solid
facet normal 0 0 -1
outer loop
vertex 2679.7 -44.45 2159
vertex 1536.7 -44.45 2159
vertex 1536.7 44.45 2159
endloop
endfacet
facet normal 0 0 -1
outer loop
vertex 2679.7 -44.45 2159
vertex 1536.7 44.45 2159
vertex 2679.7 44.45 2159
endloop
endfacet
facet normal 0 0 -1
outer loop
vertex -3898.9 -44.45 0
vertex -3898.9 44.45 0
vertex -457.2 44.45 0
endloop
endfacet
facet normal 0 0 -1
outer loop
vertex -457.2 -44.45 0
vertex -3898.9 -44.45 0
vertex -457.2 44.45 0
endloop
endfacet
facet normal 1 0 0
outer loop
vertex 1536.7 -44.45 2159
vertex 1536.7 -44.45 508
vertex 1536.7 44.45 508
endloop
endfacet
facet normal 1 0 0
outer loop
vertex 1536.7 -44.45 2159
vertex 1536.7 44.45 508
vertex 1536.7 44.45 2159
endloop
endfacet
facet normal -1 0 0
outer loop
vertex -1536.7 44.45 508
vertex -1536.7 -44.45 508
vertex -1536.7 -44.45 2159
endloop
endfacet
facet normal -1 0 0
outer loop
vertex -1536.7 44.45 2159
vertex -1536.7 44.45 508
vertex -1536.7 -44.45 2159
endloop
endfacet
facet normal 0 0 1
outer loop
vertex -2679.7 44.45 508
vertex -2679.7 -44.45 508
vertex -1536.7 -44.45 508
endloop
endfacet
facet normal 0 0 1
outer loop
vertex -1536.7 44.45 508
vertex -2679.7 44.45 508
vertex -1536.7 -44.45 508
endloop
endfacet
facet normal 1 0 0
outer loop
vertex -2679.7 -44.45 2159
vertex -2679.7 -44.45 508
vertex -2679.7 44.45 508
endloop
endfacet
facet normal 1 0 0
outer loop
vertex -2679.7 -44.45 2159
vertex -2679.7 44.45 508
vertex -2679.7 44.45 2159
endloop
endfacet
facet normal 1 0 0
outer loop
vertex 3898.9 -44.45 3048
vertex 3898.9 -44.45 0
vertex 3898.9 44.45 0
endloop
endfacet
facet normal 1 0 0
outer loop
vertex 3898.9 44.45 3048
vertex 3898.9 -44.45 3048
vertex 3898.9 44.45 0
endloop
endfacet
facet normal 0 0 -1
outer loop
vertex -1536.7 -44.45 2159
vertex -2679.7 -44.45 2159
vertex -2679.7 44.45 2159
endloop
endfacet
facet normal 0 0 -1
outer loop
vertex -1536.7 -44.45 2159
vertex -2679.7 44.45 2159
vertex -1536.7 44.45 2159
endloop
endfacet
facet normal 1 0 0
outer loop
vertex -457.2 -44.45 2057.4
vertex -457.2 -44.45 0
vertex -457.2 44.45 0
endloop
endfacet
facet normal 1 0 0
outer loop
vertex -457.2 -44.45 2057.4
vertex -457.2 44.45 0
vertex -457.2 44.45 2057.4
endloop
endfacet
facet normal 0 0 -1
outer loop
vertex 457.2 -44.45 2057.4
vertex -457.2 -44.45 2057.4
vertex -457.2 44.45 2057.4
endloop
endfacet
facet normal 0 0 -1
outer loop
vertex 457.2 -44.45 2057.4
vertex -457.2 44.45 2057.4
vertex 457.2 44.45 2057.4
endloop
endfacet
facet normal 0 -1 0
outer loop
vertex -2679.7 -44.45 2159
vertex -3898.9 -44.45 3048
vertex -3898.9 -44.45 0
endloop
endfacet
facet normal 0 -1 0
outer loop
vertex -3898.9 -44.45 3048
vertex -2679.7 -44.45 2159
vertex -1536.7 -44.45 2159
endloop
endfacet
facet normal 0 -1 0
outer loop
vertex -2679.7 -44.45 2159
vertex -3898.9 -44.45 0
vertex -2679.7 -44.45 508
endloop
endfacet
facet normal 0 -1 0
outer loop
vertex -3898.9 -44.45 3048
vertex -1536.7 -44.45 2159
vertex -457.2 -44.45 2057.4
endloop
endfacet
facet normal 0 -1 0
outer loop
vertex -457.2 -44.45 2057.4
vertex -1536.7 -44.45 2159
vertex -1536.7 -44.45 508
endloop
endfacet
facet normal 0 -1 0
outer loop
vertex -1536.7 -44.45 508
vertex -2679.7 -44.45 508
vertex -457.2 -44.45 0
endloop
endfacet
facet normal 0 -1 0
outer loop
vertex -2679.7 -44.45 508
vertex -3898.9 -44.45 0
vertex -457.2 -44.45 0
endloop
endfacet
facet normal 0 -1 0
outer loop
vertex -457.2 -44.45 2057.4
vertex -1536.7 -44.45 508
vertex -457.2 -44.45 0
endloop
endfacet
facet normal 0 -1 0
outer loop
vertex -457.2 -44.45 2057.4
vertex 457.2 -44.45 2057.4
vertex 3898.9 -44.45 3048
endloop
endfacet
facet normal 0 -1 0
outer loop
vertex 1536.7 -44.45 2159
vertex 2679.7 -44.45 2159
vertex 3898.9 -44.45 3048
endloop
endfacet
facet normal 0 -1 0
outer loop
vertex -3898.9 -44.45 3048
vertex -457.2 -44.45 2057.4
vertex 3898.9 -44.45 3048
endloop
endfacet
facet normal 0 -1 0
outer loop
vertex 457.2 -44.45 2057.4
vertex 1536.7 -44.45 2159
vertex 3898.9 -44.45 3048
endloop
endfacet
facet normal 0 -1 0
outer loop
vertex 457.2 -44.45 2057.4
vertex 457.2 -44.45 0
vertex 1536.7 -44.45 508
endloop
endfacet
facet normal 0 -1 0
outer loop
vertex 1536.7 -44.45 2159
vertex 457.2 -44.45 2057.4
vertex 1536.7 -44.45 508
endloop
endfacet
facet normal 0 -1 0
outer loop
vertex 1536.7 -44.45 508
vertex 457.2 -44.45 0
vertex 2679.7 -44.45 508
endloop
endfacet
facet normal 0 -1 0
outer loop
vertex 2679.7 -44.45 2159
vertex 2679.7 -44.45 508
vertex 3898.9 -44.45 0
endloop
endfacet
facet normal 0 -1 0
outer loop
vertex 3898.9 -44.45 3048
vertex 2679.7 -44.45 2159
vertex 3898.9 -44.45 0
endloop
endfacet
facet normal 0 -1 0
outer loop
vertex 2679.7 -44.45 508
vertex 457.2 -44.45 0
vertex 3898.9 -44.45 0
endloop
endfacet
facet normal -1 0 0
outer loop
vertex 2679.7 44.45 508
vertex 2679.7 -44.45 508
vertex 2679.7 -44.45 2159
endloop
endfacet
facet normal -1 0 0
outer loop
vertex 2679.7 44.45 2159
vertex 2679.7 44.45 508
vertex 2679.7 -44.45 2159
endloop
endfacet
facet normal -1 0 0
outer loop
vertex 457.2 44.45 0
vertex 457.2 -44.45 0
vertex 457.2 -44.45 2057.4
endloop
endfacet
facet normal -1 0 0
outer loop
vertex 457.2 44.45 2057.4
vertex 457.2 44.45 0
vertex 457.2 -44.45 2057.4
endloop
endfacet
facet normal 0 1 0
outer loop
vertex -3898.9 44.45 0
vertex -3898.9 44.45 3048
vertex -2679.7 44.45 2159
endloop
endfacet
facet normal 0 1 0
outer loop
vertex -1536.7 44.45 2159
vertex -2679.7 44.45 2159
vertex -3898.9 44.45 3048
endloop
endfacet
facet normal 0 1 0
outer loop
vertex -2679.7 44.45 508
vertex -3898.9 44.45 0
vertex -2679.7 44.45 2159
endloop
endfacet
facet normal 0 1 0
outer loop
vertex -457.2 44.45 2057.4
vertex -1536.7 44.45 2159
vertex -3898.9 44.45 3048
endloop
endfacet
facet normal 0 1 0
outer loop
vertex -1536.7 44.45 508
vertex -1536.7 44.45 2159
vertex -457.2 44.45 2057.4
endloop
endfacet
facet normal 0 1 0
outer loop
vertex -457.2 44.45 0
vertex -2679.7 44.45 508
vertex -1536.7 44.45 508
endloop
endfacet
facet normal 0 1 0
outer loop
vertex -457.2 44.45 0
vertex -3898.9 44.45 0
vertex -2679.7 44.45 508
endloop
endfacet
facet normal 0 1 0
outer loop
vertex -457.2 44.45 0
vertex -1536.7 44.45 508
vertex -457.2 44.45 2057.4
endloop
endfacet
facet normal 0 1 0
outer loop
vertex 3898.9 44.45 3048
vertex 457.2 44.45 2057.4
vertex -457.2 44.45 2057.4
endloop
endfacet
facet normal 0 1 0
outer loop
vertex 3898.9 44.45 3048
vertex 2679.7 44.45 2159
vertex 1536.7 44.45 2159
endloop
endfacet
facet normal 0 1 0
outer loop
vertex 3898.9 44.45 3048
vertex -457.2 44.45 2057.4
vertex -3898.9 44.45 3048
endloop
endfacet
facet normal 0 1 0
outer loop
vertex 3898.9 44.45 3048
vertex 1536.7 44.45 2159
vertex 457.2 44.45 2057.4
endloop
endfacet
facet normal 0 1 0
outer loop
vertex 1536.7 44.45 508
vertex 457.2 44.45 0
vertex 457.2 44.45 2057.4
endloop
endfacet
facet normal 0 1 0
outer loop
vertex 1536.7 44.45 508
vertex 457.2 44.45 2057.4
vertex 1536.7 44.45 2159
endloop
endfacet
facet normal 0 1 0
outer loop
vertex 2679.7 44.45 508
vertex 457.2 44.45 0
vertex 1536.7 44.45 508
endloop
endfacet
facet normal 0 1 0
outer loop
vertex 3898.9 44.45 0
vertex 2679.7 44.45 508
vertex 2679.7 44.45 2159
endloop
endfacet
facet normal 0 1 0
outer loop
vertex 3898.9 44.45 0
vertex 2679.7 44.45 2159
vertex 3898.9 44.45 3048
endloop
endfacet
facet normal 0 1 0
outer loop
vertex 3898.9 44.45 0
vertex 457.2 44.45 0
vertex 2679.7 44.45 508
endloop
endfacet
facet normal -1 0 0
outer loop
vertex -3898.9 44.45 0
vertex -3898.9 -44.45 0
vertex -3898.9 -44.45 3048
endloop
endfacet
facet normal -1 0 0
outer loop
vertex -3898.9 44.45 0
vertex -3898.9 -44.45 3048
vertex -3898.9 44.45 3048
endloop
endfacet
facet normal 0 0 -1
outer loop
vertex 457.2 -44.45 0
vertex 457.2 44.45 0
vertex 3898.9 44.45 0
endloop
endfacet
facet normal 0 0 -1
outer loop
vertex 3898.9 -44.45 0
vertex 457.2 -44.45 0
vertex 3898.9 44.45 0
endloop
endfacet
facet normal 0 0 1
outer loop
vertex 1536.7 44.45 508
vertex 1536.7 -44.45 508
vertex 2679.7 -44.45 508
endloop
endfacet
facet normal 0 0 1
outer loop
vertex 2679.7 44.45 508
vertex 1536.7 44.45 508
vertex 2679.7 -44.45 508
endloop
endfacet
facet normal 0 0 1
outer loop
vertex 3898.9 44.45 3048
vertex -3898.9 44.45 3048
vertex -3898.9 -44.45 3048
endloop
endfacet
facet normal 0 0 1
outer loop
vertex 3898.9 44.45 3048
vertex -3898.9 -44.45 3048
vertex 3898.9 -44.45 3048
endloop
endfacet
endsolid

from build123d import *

# Parameters (mm, degrees)
F0_W     = 7797.8
F0_H     = 88.9
F1_DEPTH = 3048
F2_W     = 1143
F2_H     = 1651
F2_W_2   = 914.4
F2_H_2   = 2057.4
F3_DEPTH = 88.901


with BuildPart() as f1:
    # F0 (on Top) → F1 (new body)
    with BuildSketch(Plane.XY):
        Rectangle(F0_W, F0_H)
    extrude(amount=F1_DEPTH)

    # F2 (on face) → F3 (cut, through all)
    with BuildSketch(Plane.XZ.offset(44.45)):
        with Locations((-2108.2, 1333.5)):
            Rectangle(F2_W, F2_H)
        with Locations((2108.2, 1333.5)):
            Rectangle(F2_W, F2_H)
        with Locations((0, 1028.7)):
            Rectangle(F2_W_2, F2_H_2)
    extrude(amount=-F3_DEPTH, mode=Mode.SUBTRACT)


solid = f1.part
